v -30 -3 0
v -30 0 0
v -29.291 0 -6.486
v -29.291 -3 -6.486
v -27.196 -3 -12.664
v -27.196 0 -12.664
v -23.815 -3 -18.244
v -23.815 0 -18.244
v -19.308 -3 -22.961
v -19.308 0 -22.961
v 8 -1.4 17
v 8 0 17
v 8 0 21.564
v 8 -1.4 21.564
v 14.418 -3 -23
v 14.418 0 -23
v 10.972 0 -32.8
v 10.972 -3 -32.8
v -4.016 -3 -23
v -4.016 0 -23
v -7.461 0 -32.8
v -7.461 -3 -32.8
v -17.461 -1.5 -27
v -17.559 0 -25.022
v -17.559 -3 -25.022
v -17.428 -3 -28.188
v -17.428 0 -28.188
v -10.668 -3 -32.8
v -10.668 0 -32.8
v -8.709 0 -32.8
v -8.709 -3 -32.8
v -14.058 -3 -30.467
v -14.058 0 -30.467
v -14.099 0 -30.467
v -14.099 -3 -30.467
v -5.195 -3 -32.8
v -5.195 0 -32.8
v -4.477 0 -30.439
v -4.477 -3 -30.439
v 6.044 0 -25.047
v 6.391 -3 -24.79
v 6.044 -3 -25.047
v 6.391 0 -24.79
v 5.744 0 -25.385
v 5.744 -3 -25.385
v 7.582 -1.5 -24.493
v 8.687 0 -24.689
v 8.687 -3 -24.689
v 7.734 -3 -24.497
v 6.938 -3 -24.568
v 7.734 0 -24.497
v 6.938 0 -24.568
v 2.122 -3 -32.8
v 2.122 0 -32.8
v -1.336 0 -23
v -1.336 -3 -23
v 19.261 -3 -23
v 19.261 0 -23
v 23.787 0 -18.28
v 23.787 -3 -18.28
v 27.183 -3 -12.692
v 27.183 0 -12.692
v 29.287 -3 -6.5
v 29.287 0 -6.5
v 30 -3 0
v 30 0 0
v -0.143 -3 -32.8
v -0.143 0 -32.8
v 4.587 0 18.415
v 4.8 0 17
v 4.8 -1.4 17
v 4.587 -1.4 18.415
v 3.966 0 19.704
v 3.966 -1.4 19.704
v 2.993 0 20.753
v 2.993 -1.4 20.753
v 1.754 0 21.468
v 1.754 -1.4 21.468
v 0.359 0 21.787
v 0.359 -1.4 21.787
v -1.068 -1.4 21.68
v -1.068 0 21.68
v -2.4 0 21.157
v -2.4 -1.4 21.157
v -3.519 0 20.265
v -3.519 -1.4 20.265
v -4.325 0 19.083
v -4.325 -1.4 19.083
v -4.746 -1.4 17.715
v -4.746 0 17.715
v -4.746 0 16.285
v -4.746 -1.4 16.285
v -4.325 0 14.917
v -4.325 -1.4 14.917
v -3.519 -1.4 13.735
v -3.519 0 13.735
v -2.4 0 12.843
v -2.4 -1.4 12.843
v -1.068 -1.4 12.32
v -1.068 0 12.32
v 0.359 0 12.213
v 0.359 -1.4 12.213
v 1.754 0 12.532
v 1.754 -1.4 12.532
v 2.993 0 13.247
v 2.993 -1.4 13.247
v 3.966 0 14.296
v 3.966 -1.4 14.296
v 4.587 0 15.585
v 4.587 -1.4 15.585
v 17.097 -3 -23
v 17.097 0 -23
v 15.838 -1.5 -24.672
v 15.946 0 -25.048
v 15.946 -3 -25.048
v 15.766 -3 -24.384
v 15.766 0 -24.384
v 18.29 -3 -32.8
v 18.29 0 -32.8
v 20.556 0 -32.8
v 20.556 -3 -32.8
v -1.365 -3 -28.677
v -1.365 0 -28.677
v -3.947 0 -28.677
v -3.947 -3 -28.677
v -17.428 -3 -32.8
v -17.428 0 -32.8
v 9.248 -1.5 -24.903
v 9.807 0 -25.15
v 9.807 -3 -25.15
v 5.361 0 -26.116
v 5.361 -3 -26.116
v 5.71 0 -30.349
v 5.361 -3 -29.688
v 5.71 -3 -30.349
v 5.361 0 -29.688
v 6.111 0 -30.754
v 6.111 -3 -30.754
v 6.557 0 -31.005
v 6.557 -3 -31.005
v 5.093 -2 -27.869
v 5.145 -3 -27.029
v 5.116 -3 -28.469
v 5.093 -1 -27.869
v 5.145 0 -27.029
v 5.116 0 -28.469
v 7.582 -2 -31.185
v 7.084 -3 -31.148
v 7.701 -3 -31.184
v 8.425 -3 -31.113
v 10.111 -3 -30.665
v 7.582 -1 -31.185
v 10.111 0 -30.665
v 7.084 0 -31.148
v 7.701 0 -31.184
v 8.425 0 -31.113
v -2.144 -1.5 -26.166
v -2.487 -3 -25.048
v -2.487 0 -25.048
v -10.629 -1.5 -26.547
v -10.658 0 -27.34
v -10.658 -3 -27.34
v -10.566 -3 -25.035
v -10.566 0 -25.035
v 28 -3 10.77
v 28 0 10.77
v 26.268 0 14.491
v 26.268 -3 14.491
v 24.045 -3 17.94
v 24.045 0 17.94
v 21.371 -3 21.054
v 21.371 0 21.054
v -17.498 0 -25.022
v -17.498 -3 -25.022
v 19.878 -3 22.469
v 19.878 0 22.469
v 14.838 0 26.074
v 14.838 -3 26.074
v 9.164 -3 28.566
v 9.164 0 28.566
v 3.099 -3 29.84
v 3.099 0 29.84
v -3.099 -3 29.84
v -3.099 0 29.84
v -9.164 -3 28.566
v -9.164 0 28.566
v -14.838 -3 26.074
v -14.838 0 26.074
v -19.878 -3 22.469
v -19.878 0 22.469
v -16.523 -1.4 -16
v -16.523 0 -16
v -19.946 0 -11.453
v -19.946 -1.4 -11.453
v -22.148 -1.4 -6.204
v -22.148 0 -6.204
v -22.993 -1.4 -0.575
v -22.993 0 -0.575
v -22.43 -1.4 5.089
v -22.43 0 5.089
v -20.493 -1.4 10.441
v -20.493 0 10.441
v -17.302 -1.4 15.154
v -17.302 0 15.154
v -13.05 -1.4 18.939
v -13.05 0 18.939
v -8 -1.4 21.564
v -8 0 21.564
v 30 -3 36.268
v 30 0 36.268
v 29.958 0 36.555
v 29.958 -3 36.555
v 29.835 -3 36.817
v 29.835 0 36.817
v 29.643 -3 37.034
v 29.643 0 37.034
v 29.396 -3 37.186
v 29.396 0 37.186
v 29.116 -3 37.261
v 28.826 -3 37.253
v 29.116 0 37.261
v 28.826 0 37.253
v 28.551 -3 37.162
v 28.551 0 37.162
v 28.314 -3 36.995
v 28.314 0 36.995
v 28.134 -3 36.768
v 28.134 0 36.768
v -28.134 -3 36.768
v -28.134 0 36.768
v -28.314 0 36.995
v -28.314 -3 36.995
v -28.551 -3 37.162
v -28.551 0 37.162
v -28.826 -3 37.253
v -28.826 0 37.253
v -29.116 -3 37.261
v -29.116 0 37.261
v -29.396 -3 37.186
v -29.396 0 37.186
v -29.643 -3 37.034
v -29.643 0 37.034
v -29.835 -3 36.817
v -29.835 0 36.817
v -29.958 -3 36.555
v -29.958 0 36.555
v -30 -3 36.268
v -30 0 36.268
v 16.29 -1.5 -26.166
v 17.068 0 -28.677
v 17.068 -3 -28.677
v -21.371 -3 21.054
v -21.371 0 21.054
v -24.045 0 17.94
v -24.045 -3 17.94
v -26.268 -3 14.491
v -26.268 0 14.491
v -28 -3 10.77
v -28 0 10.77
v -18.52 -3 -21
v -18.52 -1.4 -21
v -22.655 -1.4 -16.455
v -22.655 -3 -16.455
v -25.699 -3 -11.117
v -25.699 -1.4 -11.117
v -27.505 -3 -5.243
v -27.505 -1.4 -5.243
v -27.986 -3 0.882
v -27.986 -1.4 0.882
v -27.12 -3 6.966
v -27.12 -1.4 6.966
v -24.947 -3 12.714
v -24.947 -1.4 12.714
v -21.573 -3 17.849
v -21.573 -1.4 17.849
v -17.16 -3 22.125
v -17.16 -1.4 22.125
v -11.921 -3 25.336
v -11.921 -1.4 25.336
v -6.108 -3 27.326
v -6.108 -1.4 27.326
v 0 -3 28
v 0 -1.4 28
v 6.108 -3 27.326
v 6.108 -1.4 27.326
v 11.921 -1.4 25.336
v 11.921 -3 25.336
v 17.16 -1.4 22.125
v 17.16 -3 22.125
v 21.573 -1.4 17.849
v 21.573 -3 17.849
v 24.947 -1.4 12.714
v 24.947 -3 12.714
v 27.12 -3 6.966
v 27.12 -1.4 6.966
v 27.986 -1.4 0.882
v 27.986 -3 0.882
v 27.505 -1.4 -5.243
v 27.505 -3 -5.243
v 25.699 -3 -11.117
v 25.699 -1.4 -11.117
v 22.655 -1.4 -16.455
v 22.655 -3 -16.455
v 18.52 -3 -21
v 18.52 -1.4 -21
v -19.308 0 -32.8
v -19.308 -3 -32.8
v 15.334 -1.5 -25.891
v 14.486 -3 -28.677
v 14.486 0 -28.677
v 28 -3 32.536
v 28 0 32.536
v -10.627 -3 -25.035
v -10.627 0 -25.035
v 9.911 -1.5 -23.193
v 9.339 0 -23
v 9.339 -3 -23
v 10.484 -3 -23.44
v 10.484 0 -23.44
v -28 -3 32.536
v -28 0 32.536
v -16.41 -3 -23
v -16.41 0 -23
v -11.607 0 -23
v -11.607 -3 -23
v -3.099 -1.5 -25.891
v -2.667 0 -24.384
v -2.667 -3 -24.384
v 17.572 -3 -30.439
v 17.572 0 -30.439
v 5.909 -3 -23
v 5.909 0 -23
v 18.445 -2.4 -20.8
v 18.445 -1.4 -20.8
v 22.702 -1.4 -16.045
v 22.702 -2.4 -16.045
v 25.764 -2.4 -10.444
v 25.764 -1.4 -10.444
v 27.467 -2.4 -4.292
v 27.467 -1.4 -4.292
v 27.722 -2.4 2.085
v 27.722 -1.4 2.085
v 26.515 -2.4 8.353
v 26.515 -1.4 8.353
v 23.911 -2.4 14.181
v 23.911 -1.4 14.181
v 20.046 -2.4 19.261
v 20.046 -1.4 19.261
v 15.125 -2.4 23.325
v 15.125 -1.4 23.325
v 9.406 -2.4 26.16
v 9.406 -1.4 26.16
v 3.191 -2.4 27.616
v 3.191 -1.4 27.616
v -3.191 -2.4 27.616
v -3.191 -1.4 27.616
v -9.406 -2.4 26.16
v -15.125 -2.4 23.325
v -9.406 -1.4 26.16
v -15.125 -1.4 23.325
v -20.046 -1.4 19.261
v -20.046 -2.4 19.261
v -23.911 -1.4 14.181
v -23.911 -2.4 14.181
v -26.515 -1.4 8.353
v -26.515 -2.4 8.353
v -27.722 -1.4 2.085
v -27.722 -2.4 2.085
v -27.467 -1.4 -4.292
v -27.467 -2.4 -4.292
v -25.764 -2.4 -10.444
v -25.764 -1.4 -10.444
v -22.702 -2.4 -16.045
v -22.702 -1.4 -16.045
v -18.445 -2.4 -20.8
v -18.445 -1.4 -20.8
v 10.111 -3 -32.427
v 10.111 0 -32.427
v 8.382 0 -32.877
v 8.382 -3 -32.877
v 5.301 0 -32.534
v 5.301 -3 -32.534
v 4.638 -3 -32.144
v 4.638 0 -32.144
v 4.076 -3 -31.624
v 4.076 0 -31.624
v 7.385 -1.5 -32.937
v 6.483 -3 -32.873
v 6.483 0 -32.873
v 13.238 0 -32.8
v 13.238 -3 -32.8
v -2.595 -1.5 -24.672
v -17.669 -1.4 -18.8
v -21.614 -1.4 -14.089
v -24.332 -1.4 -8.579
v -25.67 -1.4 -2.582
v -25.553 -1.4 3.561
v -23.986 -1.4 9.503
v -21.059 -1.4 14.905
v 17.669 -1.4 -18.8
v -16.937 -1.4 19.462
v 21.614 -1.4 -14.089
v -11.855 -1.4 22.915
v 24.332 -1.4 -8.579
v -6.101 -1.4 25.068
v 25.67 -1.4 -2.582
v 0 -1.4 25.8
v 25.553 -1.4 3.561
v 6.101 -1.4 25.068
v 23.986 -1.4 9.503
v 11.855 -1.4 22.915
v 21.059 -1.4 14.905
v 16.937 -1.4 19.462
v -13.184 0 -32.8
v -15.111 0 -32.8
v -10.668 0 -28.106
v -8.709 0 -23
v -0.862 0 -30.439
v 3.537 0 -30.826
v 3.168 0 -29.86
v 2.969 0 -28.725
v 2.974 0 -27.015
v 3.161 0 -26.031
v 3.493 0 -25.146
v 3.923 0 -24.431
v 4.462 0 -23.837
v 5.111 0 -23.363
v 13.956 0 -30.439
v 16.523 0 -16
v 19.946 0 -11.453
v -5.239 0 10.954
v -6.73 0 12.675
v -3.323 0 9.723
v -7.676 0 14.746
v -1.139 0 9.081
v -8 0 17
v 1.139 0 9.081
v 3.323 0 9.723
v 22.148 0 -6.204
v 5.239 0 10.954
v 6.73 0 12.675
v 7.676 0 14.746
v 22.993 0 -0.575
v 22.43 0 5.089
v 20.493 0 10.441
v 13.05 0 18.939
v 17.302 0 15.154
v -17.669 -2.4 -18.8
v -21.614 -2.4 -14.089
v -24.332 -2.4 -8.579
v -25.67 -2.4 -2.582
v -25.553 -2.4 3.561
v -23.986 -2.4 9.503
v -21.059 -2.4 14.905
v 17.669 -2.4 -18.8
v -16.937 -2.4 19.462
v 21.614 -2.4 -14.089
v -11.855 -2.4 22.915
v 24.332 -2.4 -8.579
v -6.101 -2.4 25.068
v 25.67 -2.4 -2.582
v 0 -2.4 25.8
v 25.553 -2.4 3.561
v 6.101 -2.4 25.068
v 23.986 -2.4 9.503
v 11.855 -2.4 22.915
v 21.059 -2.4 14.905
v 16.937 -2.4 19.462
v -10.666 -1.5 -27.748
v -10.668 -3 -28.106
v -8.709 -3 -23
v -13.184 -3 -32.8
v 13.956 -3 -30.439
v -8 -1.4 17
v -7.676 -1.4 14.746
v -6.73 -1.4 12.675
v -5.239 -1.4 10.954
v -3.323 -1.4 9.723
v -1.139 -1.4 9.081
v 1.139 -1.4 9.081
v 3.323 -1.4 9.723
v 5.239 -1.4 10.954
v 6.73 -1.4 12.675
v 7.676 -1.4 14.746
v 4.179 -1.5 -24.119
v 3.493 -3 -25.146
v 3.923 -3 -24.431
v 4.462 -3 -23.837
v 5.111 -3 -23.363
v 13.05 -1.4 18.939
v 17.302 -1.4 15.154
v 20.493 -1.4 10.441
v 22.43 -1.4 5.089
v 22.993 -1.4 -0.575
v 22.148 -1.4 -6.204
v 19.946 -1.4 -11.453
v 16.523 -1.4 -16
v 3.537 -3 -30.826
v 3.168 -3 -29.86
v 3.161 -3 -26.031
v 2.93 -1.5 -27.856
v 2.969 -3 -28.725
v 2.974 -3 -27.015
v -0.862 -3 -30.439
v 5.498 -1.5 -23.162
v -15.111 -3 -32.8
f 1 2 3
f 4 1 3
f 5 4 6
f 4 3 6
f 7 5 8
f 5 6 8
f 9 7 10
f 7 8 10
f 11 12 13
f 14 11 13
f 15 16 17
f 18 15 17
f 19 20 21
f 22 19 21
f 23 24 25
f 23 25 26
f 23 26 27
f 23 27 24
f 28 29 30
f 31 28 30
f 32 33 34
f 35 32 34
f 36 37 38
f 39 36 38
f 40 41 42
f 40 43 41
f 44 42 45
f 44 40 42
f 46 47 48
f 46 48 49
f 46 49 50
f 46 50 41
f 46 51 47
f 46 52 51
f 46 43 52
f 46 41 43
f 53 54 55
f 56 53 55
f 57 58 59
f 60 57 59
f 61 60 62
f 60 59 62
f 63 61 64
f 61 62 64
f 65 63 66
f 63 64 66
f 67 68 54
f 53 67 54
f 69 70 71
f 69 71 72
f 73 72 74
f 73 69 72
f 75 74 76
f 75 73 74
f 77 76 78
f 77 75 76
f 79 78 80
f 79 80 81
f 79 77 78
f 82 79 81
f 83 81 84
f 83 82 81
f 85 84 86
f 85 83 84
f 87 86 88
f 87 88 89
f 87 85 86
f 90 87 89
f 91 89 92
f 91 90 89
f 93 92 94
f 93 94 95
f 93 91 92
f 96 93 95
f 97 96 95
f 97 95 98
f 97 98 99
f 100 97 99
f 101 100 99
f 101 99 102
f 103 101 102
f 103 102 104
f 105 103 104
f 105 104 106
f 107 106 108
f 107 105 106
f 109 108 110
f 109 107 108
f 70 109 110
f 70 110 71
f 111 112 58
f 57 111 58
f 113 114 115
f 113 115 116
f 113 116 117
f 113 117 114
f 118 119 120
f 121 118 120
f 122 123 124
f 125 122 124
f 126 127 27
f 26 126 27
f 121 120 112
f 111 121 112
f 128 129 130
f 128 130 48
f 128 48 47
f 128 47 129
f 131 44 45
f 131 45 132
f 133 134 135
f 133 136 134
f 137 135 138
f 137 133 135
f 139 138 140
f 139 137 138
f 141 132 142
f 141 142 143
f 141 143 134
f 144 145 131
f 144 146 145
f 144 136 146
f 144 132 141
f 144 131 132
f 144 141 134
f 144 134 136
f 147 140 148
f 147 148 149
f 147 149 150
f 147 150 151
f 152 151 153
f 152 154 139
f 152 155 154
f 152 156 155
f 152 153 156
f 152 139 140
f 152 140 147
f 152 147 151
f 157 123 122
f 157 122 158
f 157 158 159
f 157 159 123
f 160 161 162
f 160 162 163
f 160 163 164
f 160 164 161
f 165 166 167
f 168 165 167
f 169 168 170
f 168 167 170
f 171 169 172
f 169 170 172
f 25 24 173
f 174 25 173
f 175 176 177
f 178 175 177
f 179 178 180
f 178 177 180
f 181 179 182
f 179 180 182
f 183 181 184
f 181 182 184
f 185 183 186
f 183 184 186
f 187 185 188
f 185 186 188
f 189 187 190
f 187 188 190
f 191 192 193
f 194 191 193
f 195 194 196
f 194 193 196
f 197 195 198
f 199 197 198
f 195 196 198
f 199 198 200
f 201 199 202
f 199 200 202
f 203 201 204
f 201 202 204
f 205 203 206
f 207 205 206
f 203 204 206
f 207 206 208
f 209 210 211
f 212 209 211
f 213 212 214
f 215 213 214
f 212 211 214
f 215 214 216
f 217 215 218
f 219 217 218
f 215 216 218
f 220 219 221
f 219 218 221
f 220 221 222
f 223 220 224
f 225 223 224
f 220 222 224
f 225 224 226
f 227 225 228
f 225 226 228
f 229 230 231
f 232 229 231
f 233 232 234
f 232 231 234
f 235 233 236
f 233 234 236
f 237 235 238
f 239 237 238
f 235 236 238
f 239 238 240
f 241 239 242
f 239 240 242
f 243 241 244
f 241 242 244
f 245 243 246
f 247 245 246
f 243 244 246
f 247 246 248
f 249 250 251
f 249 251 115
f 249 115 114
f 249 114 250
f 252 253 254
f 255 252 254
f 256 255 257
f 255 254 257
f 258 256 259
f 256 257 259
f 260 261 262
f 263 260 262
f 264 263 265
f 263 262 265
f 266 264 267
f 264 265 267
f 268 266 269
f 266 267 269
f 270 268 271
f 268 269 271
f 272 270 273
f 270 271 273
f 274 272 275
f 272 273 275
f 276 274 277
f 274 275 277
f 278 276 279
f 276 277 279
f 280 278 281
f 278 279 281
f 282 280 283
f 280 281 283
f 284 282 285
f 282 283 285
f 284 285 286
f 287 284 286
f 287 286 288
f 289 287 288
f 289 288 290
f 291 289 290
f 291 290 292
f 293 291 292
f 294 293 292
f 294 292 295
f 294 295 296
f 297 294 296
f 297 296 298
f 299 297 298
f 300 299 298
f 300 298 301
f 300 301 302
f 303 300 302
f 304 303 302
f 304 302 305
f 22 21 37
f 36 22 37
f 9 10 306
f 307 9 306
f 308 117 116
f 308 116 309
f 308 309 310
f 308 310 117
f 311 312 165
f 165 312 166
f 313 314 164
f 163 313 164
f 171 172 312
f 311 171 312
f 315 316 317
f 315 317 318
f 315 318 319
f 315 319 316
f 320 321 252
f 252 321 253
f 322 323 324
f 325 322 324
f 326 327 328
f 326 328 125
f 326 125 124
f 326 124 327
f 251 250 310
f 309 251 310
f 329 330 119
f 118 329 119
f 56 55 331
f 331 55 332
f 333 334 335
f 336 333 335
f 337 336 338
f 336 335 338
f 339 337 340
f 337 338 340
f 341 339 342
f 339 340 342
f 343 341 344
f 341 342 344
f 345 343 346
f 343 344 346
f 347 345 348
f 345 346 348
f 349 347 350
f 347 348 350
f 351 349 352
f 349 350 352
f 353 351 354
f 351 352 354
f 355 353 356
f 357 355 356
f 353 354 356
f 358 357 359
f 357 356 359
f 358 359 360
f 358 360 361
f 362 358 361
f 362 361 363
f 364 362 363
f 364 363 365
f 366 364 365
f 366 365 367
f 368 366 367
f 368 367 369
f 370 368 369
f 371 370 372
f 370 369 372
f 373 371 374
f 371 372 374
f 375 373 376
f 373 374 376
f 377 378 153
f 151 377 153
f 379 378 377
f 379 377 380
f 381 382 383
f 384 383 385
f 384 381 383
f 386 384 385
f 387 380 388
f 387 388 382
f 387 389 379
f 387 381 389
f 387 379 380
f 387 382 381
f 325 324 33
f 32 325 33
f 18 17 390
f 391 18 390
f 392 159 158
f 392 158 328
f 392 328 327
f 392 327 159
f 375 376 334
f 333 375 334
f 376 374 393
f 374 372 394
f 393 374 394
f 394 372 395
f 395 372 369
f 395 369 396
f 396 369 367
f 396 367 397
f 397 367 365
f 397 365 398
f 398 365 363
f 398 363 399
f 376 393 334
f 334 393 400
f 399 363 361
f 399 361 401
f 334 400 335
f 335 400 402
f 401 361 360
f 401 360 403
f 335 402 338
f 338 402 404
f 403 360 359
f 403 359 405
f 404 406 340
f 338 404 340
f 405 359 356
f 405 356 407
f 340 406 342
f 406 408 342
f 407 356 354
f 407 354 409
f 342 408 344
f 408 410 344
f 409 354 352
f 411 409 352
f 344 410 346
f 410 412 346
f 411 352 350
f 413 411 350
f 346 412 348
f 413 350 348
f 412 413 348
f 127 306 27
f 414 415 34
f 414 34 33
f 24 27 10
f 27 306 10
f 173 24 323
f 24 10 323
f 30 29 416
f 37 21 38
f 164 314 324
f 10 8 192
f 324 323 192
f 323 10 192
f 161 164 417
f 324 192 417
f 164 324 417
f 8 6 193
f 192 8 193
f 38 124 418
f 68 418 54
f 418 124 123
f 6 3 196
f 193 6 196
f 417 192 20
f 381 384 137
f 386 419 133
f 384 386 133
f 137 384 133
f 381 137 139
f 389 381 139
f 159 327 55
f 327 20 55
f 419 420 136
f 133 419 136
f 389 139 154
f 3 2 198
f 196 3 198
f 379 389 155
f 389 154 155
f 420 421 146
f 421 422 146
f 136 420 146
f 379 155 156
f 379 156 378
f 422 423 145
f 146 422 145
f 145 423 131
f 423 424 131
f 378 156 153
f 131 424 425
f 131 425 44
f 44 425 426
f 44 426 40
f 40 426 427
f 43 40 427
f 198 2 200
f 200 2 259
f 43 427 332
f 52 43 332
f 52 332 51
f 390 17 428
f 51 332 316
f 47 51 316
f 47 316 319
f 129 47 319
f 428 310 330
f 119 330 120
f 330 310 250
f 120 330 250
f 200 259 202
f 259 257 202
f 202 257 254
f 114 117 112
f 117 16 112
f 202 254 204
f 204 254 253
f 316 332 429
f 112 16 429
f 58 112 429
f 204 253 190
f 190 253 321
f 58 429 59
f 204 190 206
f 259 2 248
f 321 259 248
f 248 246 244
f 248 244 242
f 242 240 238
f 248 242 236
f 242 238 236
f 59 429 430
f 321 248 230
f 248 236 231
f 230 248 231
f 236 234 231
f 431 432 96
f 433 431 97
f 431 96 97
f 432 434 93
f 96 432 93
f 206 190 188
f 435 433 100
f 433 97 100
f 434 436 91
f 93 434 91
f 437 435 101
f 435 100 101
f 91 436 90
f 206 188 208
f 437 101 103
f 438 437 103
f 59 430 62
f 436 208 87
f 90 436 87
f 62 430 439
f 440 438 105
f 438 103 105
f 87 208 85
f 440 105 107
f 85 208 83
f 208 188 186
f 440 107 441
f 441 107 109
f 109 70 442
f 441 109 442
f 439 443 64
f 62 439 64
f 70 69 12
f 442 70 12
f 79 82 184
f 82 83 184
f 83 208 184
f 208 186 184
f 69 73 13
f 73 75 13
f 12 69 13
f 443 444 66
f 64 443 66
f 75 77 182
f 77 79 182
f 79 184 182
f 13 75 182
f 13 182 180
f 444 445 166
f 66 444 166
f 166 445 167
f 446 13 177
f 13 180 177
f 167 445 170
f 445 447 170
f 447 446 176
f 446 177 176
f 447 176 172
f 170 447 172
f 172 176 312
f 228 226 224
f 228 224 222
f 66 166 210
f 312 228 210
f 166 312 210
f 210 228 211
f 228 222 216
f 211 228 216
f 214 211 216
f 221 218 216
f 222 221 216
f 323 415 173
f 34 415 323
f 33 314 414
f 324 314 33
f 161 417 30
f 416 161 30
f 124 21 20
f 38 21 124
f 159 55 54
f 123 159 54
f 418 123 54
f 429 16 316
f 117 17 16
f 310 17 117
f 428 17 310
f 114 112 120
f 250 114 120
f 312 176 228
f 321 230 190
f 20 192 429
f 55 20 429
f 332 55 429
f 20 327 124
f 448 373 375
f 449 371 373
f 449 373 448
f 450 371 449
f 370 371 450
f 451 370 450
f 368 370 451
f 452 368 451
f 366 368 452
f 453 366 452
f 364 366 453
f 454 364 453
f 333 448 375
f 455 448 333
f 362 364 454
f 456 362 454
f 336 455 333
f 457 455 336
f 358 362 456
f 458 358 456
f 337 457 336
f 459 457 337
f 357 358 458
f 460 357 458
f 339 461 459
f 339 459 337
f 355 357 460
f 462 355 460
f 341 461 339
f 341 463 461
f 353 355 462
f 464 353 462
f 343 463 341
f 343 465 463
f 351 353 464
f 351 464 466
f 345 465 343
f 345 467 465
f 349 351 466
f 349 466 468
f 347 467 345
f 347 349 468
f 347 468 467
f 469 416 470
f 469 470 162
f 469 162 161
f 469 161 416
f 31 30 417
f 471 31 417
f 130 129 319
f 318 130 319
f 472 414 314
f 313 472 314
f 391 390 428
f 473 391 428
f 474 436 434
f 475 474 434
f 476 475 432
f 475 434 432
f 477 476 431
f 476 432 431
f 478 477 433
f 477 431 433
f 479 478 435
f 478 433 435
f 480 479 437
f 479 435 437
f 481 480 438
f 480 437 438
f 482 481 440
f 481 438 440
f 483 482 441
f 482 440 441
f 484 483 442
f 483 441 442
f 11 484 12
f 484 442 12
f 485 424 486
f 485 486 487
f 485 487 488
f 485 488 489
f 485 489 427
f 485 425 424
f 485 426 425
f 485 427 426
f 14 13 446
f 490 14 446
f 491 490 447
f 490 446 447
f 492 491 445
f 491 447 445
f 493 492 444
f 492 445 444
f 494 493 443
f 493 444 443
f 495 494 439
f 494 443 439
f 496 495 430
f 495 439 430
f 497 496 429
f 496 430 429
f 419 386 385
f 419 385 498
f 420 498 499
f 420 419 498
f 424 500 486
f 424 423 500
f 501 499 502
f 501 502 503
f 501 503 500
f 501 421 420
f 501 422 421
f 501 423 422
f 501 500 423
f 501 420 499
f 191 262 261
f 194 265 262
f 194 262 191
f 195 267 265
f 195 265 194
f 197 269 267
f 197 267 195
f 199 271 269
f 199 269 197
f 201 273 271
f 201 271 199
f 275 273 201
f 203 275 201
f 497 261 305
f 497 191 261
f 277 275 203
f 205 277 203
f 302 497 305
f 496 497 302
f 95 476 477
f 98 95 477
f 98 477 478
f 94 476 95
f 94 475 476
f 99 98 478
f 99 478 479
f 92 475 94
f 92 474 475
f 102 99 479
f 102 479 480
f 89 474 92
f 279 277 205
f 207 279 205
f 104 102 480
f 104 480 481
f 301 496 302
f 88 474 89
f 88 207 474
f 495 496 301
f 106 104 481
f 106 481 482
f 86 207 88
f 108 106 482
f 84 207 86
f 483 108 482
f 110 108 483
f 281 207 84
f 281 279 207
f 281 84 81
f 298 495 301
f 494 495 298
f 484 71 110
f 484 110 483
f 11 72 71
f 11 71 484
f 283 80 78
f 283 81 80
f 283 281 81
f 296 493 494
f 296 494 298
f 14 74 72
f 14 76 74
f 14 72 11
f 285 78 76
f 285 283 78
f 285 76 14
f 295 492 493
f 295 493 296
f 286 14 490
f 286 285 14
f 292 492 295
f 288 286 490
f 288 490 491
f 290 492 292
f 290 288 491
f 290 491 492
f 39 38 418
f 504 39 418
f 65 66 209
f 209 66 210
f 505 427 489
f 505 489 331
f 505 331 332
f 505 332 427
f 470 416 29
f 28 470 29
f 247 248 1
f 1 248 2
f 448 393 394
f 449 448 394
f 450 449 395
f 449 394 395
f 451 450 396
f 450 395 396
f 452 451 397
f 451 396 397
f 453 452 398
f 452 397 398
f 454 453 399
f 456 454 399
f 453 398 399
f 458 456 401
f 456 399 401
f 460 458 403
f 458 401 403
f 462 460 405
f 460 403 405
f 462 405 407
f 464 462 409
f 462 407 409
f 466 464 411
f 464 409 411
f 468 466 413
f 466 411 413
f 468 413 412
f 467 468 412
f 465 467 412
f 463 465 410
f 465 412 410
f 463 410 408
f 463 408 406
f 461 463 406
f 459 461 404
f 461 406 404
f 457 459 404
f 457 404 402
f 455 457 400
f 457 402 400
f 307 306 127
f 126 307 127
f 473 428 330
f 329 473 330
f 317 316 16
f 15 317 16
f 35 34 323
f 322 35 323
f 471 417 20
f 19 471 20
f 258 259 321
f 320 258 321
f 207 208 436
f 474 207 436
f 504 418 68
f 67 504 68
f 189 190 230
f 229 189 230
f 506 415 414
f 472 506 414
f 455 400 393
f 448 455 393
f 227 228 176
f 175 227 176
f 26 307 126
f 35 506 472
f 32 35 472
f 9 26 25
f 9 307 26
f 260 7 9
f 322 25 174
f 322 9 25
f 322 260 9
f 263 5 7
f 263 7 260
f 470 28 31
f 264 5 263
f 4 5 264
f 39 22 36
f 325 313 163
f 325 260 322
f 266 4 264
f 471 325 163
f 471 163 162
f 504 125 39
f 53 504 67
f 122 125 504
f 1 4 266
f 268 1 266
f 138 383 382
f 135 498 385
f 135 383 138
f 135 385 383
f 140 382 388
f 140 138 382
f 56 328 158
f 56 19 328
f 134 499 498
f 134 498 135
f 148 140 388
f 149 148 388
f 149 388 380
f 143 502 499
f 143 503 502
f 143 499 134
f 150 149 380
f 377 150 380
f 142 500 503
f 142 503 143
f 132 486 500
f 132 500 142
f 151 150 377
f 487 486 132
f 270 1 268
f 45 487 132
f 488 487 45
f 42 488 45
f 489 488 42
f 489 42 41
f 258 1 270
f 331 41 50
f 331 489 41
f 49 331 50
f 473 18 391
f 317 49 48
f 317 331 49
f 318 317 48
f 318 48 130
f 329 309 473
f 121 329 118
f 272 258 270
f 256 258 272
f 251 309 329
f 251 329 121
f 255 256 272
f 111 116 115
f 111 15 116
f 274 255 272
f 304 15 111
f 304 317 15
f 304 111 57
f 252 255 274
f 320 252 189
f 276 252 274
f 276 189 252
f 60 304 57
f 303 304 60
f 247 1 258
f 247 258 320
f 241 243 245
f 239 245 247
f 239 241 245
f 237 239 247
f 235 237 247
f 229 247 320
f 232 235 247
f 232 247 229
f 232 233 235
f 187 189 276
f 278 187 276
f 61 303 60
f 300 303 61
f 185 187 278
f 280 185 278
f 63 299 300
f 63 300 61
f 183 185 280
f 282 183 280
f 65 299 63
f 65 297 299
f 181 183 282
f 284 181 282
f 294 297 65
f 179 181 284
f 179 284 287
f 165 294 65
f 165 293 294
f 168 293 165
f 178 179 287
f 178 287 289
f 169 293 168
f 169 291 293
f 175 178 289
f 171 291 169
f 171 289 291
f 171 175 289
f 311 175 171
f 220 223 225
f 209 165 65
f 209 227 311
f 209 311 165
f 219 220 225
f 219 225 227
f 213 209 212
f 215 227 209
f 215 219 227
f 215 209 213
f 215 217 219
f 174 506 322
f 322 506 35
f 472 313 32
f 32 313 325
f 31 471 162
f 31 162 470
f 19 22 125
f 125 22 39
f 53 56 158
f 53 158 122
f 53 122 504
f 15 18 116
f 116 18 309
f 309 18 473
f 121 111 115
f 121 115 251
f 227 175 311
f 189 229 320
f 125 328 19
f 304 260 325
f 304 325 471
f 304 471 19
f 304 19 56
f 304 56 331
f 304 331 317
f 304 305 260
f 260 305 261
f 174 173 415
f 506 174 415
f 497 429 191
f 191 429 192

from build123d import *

# Parameters (mm, degrees)
F1_DEPTH = 3
F0_R     = 4.8
F2_DEPTH = 1.4
F4_DEPTH = 1


with BuildPart() as f1:
    # F0 (on Front) → F1 (new body)
    with BuildSketch(Plane.XZ):
        with BuildLine():
            Line((17.0973602635, -23), (19.2613602843, -23))
            ThreePointArc((19.2613602843, -23), (27.1830904105, -12.6917136643), (30, 0))
            ThreePointArc((30, 0), (29.4957624075, 5.4772255751), (28, 10.7703296143))
            ThreePointArc((28, 10.7703296143), (25.2153559369, 16.2537941718), (21.3710330072, 21.0541907516))
            ThreePointArc((21.3710330072, 21.0541907516), (20.6368373831, 21.7743184239), (19.8783905611, 22.4688581975))
            ThreePointArc((19.8783905611, 22.4688581975), (0, 30), (-19.8783905611, 22.4688581975))
            ThreePointArc((-19.8783905611, 22.4688581975), (-20.6368373831, 21.7743184239), (-21.3710330072, 21.0541907516))
            ThreePointArc((-21.3710330072, 21.0541907516), (-25.2153559369, 16.2537941718), (-28, 10.7703296143))
            ThreePointArc((-28, 10.7703296143), (-29.4957624075, 5.4772255751), (-30, 0))
            ThreePointArc((-30, 0), (-27.1958799346, -12.6642850009), (-19.3077256944, -22.9610916227))
            Line((-19.3077256944, -22.9610916227), (-19.3077256944, -22.8846354167))
            Line((-19.3077256944, -22.8846354167), (-16.4453125, -22.8846354167))
            Line((-16.4453125, -22.8846354167), (-16.4096201375, -23))
            Line((-16.4096201375, -23), (-11.6068819613, -23))
            Line((-11.6068819613, -23), (-11.5690104167, -22.8846354167))
            Line((-11.5690104167, -22.8846354167), (-8.7087673611, -22.8846354167))
            Line((-8.7087673611, -22.8846354167), (-8.7087673611, -23))
            Line((-8.7087673611, -23), (-4.0155582498, -23))
            Line((-4.0155582498, -23), (-3.9605034722, -22.8434027778))
            Line((-3.9605034722, -22.8434027778), (-1.3910590278, -22.8434027778))
            Line((-1.3910590278, -22.8434027778), (-1.3357994587, -23))
            Line((-1.3357994587, -23), (5.909137391, -23))
            add(Edge.make_bspline(
                [(5.909137391, -23), (6.670805287, -22.7435763889), (7.5824652778, -22.7435763889)],
                knots=[0.3566723985, 0.3566723985, 0.3566723985, 1, 1, 1], degree=2))
            add(Edge.make_bspline(
                [(7.5824652778, -22.7435763889), (8.4580373485, -22.7435763889), (9.3392012113, -23)],
                knots=[0, 0, 0, 0.6067121958, 0.6067121958, 0.6067121958], degree=2))
            Line((9.3392012113, -23), (14.4176014724, -23))
            Line((14.4176014724, -23), (14.47265625, -22.8434027778))
            Line((14.47265625, -22.8434027778), (17.0421006944, -22.8434027778))
            Line((17.0421006944, -22.8434027778), (17.0973602635, -23))
        make_face()
        with BuildLine():
            ThreePointArc((-18.5202591775, -21), (0, 28), (18.5202591775, -21))
            Line((18.5202591775, -21), (-18.5202591775, -21))
        make_face(mode=Mode.SUBTRACT)
        with BuildLine():
            ThreePointArc((28, 10.7703296143), (29.4957624075, 5.4772255751), (30, 0))
            Line((30, 0), (30, 36.2679491924))
            ThreePointArc((30, 36.2679491924), (29.2588190451, 37.2338750187), (28.1339745962, 36.7679491924))
            Line((28.1339745962, 36.7679491924), (19.8783905611, 22.4688581975))
            ThreePointArc((19.8783905611, 22.4688581975), (20.6368373831, 21.7743184239), (21.3710330072, 21.0541907516))
            Line((21.3710330072, 21.0541907516), (28, 32.5358983849))
            Line((28, 32.5358983849), (28, 10.7703296143))
        make_face()
        Polygon((20.5555555556, -32.8), (17.0973602635, -23), (14.4176014724, -23), (10.9722222222, -32.8), (13.2378472222, -32.8), (13.9561631944, -30.4388888889), (17.5716145833, -30.4388888889), (18.2899305556, -32.8), align=None)
        with BuildLine():
            add(Edge.make_bspline(
                [(17.0681423611, -28.6767361111), (16.0720486111, -25.4692708333), (15.9461805556, -25.0482638889)],
                knots=[0, 0, 0, 1, 1, 1], degree=2))
            Line((17.0681423611, -28.6767361111), (14.4856770833, -28.6767361111))
            add(Edge.make_bspline(
                [(15.7660590278, -24.3842013889), (15.5425347222, -25.2522569444), (14.4856770833, -28.6767361111)],
                knots=[0, 0, 0, 1, 1, 1], degree=2))
            add(Edge.make_bspline(
                [(15.9461805556, -25.0482638889), (15.8203125, -24.6272569444), (15.7660590278, -24.3842013889)],
                knots=[0, 0, 0, 1, 1, 1], degree=2))
        make_face(mode=Mode.SUBTRACT)
        Polygon((14.4176014724, -23), (17.0973602635, -23), (17.0421006944, -22.8434027778), (14.47265625, -22.8434027778), align=None)
        with BuildLine():
            add(Edge.make_bspline(
                [(9.3392012113, -23), (9.9103962577, -23.1662209523), (10.4839409722, -23.4401909722)],
                knots=[0.6067121958, 0.6067121958, 0.6067121958, 1, 1, 1], degree=2))
            Line((9.3392012113, -23), (5.909137391, -23))
            add(Edge.make_bspline(
                [(5.1106770833, -23.3631510417), (5.4868550037, -23.1421658642), (5.909137391, -23)],
                knots=[0, 0, 0, 0.3566723985, 0.3566723985, 0.3566723985], degree=2))
            add(Edge.make_bspline(
                [(3.4928385417, -25.1459201389), (4.0559895833, -23.9827256944), (5.1106770833, -23.3631510417)],
                knots=[0, 0, 0, 1, 1, 1], degree=2))
            add(Edge.make_bspline(
                [(2.9296875, -27.8564236111), (2.9296875, -26.3091145833), (3.4928385417, -25.1459201389)],
                knots=[0, 0, 0, 1, 1, 1], degree=2))
            add(Edge.make_bspline(
                [(4.0755208333, -31.6237847222), (2.9296875, -30.3108506944), (2.9296875, -27.8564236111)],
                knots=[0, 0, 0, 1, 1, 1], degree=2))
            add(Edge.make_bspline(
                [(7.3849826389, -32.93671875), (5.2213541667, -32.93671875), (4.0755208333, -31.6237847222)],
                knots=[0, 0, 0, 1, 1, 1], degree=2))
            add(Edge.make_bspline(
                [(10.1106770833, -32.4267361111), (8.8910590278, -32.93671875), (7.3849826389, -32.93671875)],
                knots=[0, 0, 0, 1, 1, 1], degree=2))
            Line((10.1106770833, -32.4267361111), (10.1106770833, -30.6645833333))
            add(Edge.make_bspline(
                [(7.5824652778, -31.1854166667), (8.6263020833, -31.1854166667), (10.1106770833, -30.6645833333)],
                knots=[0, 0, 0, 1, 1, 1], degree=2))
            add(Edge.make_bspline(
                [(5.0933159722, -27.8694444444), (5.0933159722, -31.1854166667), (7.5824652778, -31.1854166667)],
                knots=[0, 0, 0, 1, 1, 1], degree=2))
            add(Edge.make_bspline(
                [(5.7443576389, -25.3846354167), (5.0933159722, -26.2765625), (5.0933159722, -27.8694444444)],
                knots=[0, 0, 0, 1, 1, 1], degree=2))
            add(Edge.make_bspline(
                [(7.5824652778, -24.4927083333), (6.3953993056, -24.4927083333), (5.7443576389, -25.3846354167)],
                knots=[0, 0, 0, 1, 1, 1], degree=2))
            add(Edge.make_bspline(
                [(8.6870659722, -24.6891059028), (8.125, -24.4927083333), (7.5824652778, -24.4927083333)],
                knots=[0, 0, 0, 1, 1, 1], degree=2))
            add(Edge.make_bspline(
                [(9.8068576389, -25.1502604167), (9.2491319444, -24.8855034722), (8.6870659722, -24.6891059028)],
                knots=[0, 0, 0, 1, 1, 1], degree=2))
            Line((9.8068576389, -25.1502604167), (10.4839409722, -23.4401909722))
        make_face()
        with BuildLine():
            Line((5.909137391, -23), (9.3392012113, -23))
            add(Edge.make_bspline(
                [(7.5824652778, -22.7435763889), (8.4580373485, -22.7435763889), (9.3392012113, -23)],
                knots=[0, 0, 0, 0.6067121958, 0.6067121958, 0.6067121958], degree=2))
            add(Edge.make_bspline(
                [(5.909137391, -23), (6.670805287, -22.7435763889), (7.5824652778, -22.7435763889)],
                knots=[0.3566723985, 0.3566723985, 0.3566723985, 1, 1, 1], degree=2))
        make_face()
        with BuildLine():
            ThreePointArc((-21.3710330072, 21.0541907516), (-20.6368373831, 21.7743184239), (-19.8783905611, 22.4688581975))
            Line((-19.8783905611, 22.4688581975), (-28.1339745962, 36.7679491924))
            ThreePointArc((-28.1339745962, 36.7679491924), (-29.2588190451, 37.2338750187), (-30, 36.2679491924))
            Line((-30, 36.2679491924), (-30, 0))
            ThreePointArc((-30, 0), (-29.4957624075, 5.4772255751), (-28, 10.7703296143))
            Line((-28, 10.7703296143), (-28, 32.5358983849))
            Line((-28, 32.5358983849), (-21.3710330072, 21.0541907516))
        make_face()
        Polygon((2.1223958333, -32.8), (-1.3357994587, -23), (-4.0155582498, -23), (-7.4609375, -32.8), (-5.1953125, -32.8), (-4.4769965278, -30.4388888889), (-0.8615451389, -30.4388888889), (-0.1432291667, -32.8), align=None)
        with BuildLine():
            add(Edge.make_bspline(
                [(-1.3650173611, -28.6767361111), (-2.3611111111, -25.4692708333), (-2.4869791667, -25.0482638889)],
                knots=[0, 0, 0, 1, 1, 1], degree=2))
            Line((-1.3650173611, -28.6767361111), (-3.9474826389, -28.6767361111))
            add(Edge.make_bspline(
                [(-2.6671006944, -24.3842013889), (-2.890625, -25.2522569444), (-3.9474826389, -28.6767361111)],
                knots=[0, 0, 0, 1, 1, 1], degree=2))
            add(Edge.make_bspline(
                [(-2.4869791667, -25.0482638889), (-2.6128472222, -24.6272569444), (-2.6671006944, -24.3842013889)],
                knots=[0, 0, 0, 1, 1, 1], degree=2))
        make_face(mode=Mode.SUBTRACT)
        Polygon((-4.0155582498, -23), (-1.3357994587, -23), (-1.3910590278, -22.8434027778), (-3.9605034722, -22.8434027778), align=None)
        with BuildLine():
            Line((-8.7087673611, -32.8), (-8.7087673611, -23))
            Line((-8.7087673611, -23), (-11.6068819613, -23))
            Line((-11.6068819613, -23), (-14.0581597222, -30.4671006944))
            Line((-14.0581597222, -30.4671006944), (-14.0993923611, -30.4671006944))
            Line((-14.0993923611, -30.4671006944), (-16.4096201375, -23))
            Line((-16.4096201375, -23), (-19.2613602843, -23))
            ThreePointArc((-19.2613602843, -23), (-19.284552802, -22.9805575047), (-19.3077256944, -22.9610916227))
            Line((-19.3077256944, -22.9610916227), (-19.3077256944, -32.8))
            Line((-19.3077256944, -32.8), (-17.4283854167, -32.8))
            Line((-17.4283854167, -32.8), (-17.4283854167, -28.1884548611))
            add(Edge.make_bspline(
                [(-17.55859375, -25.0222222222), (-17.4283854167, -27.3941840278), (-17.4283854167, -28.1884548611)],
                knots=[0, 0, 0, 1, 1, 1], degree=2))
            Line((-17.55859375, -25.0222222222), (-17.4978298611, -25.0222222222))
            Line((-17.4978298611, -25.0222222222), (-15.1106770833, -32.8))
            Line((-15.1106770833, -32.8), (-13.18359375, -32.8))
            Line((-13.18359375, -32.8), (-10.6271701389, -25.0352430556))
            Line((-10.6271701389, -25.0352430556), (-10.56640625, -25.0352430556))
            add(Edge.make_bspline(
                [(-10.6575520833, -27.3399305556), (-10.6467013889, -26.9059027778), (-10.56640625, -25.0352430556)],
                knots=[0, 0, 0, 1, 1, 1], degree=2))
            add(Edge.make_bspline(
                [(-10.6684027778, -28.1059895833), (-10.6684027778, -27.7739583333), (-10.6575520833, -27.3399305556)],
                knots=[0, 0, 0, 1, 1, 1], degree=2))
            Line((-10.6684027778, -28.1059895833), (-10.6684027778, -32.8))
            Line((-10.6684027778, -32.8), (-8.7087673611, -32.8))
        make_face()
        Polygon((-11.6068819613, -23), (-8.7087673611, -23), (-8.7087673611, -22.8846354167), (-11.5690104167, -22.8846354167), align=None)
        with BuildLine():
            Line((-19.3077256944, -22.8846354167), (-19.3077256944, -22.9610916227))
            ThreePointArc((-19.3077256944, -22.9610916227), (-19.284552802, -22.9805575047), (-19.2613602843, -23))
            Line((-19.2613602843, -23), (-16.4096201375, -23))
            Line((-16.4096201375, -23), (-16.4453125, -22.8846354167))
            Line((-16.4453125, -22.8846354167), (-19.3077256944, -22.8846354167))
        make_face()
    extrude(amount=F1_DEPTH)

    # F0 (on Front) → F2 (join)
    with BuildSketch(Plane.XZ):
        with BuildLine():
            Line((-18.5202591775, -21), (18.5202591775, -21))
            ThreePointArc((18.5202591775, -21), (0, 28), (-18.5202591775, -21))
        make_face()
        with BuildLine():
            ThreePointArc((8, 21.5638586528), (22.4299290188, 5.0890356856), (16.5227116419, -16))
            Line((16.5227116419, -16), (-16.5227116419, -16))
            ThreePointArc((-16.5227116419, -16), (-22.4299290188, 5.0890356856), (-8, 21.5638586528))
            Line((-8, 21.5638586528), (-8, 17))
            ThreePointArc((-8, 17), (0, 9), (8, 17))
            Line((8, 17), (8, 21.5638586528))
        make_face(mode=Mode.SUBTRACT)
        with Locations((0, 17)):
            Circle(F0_R, mode=Mode.SUBTRACT)
    extrude(amount=F2_DEPTH)


with BuildPart() as f4:
    # F3 (on face) → F4 (new body)
    with BuildSketch(Plane.XZ.offset(1.4)):
        with BuildLine():
            ThreePointArc((18.4445113787, -20.8), (0, 27.8), (-18.4445113787, -20.8))
            Line((-18.4445113787, -20.8), (18.4445113787, -20.8))
        make_face()
        with BuildLine():
            Line((17.6691822108, -18.8), (-17.6691822108, -18.8))
            ThreePointArc((-17.6691822108, -18.8), (0, 25.8), (17.6691822108, -18.8))
        make_face(mode=Mode.SUBTRACT)
    extrude(amount=F4_DEPTH)


solid = Compound([f1.part, f4.part])
